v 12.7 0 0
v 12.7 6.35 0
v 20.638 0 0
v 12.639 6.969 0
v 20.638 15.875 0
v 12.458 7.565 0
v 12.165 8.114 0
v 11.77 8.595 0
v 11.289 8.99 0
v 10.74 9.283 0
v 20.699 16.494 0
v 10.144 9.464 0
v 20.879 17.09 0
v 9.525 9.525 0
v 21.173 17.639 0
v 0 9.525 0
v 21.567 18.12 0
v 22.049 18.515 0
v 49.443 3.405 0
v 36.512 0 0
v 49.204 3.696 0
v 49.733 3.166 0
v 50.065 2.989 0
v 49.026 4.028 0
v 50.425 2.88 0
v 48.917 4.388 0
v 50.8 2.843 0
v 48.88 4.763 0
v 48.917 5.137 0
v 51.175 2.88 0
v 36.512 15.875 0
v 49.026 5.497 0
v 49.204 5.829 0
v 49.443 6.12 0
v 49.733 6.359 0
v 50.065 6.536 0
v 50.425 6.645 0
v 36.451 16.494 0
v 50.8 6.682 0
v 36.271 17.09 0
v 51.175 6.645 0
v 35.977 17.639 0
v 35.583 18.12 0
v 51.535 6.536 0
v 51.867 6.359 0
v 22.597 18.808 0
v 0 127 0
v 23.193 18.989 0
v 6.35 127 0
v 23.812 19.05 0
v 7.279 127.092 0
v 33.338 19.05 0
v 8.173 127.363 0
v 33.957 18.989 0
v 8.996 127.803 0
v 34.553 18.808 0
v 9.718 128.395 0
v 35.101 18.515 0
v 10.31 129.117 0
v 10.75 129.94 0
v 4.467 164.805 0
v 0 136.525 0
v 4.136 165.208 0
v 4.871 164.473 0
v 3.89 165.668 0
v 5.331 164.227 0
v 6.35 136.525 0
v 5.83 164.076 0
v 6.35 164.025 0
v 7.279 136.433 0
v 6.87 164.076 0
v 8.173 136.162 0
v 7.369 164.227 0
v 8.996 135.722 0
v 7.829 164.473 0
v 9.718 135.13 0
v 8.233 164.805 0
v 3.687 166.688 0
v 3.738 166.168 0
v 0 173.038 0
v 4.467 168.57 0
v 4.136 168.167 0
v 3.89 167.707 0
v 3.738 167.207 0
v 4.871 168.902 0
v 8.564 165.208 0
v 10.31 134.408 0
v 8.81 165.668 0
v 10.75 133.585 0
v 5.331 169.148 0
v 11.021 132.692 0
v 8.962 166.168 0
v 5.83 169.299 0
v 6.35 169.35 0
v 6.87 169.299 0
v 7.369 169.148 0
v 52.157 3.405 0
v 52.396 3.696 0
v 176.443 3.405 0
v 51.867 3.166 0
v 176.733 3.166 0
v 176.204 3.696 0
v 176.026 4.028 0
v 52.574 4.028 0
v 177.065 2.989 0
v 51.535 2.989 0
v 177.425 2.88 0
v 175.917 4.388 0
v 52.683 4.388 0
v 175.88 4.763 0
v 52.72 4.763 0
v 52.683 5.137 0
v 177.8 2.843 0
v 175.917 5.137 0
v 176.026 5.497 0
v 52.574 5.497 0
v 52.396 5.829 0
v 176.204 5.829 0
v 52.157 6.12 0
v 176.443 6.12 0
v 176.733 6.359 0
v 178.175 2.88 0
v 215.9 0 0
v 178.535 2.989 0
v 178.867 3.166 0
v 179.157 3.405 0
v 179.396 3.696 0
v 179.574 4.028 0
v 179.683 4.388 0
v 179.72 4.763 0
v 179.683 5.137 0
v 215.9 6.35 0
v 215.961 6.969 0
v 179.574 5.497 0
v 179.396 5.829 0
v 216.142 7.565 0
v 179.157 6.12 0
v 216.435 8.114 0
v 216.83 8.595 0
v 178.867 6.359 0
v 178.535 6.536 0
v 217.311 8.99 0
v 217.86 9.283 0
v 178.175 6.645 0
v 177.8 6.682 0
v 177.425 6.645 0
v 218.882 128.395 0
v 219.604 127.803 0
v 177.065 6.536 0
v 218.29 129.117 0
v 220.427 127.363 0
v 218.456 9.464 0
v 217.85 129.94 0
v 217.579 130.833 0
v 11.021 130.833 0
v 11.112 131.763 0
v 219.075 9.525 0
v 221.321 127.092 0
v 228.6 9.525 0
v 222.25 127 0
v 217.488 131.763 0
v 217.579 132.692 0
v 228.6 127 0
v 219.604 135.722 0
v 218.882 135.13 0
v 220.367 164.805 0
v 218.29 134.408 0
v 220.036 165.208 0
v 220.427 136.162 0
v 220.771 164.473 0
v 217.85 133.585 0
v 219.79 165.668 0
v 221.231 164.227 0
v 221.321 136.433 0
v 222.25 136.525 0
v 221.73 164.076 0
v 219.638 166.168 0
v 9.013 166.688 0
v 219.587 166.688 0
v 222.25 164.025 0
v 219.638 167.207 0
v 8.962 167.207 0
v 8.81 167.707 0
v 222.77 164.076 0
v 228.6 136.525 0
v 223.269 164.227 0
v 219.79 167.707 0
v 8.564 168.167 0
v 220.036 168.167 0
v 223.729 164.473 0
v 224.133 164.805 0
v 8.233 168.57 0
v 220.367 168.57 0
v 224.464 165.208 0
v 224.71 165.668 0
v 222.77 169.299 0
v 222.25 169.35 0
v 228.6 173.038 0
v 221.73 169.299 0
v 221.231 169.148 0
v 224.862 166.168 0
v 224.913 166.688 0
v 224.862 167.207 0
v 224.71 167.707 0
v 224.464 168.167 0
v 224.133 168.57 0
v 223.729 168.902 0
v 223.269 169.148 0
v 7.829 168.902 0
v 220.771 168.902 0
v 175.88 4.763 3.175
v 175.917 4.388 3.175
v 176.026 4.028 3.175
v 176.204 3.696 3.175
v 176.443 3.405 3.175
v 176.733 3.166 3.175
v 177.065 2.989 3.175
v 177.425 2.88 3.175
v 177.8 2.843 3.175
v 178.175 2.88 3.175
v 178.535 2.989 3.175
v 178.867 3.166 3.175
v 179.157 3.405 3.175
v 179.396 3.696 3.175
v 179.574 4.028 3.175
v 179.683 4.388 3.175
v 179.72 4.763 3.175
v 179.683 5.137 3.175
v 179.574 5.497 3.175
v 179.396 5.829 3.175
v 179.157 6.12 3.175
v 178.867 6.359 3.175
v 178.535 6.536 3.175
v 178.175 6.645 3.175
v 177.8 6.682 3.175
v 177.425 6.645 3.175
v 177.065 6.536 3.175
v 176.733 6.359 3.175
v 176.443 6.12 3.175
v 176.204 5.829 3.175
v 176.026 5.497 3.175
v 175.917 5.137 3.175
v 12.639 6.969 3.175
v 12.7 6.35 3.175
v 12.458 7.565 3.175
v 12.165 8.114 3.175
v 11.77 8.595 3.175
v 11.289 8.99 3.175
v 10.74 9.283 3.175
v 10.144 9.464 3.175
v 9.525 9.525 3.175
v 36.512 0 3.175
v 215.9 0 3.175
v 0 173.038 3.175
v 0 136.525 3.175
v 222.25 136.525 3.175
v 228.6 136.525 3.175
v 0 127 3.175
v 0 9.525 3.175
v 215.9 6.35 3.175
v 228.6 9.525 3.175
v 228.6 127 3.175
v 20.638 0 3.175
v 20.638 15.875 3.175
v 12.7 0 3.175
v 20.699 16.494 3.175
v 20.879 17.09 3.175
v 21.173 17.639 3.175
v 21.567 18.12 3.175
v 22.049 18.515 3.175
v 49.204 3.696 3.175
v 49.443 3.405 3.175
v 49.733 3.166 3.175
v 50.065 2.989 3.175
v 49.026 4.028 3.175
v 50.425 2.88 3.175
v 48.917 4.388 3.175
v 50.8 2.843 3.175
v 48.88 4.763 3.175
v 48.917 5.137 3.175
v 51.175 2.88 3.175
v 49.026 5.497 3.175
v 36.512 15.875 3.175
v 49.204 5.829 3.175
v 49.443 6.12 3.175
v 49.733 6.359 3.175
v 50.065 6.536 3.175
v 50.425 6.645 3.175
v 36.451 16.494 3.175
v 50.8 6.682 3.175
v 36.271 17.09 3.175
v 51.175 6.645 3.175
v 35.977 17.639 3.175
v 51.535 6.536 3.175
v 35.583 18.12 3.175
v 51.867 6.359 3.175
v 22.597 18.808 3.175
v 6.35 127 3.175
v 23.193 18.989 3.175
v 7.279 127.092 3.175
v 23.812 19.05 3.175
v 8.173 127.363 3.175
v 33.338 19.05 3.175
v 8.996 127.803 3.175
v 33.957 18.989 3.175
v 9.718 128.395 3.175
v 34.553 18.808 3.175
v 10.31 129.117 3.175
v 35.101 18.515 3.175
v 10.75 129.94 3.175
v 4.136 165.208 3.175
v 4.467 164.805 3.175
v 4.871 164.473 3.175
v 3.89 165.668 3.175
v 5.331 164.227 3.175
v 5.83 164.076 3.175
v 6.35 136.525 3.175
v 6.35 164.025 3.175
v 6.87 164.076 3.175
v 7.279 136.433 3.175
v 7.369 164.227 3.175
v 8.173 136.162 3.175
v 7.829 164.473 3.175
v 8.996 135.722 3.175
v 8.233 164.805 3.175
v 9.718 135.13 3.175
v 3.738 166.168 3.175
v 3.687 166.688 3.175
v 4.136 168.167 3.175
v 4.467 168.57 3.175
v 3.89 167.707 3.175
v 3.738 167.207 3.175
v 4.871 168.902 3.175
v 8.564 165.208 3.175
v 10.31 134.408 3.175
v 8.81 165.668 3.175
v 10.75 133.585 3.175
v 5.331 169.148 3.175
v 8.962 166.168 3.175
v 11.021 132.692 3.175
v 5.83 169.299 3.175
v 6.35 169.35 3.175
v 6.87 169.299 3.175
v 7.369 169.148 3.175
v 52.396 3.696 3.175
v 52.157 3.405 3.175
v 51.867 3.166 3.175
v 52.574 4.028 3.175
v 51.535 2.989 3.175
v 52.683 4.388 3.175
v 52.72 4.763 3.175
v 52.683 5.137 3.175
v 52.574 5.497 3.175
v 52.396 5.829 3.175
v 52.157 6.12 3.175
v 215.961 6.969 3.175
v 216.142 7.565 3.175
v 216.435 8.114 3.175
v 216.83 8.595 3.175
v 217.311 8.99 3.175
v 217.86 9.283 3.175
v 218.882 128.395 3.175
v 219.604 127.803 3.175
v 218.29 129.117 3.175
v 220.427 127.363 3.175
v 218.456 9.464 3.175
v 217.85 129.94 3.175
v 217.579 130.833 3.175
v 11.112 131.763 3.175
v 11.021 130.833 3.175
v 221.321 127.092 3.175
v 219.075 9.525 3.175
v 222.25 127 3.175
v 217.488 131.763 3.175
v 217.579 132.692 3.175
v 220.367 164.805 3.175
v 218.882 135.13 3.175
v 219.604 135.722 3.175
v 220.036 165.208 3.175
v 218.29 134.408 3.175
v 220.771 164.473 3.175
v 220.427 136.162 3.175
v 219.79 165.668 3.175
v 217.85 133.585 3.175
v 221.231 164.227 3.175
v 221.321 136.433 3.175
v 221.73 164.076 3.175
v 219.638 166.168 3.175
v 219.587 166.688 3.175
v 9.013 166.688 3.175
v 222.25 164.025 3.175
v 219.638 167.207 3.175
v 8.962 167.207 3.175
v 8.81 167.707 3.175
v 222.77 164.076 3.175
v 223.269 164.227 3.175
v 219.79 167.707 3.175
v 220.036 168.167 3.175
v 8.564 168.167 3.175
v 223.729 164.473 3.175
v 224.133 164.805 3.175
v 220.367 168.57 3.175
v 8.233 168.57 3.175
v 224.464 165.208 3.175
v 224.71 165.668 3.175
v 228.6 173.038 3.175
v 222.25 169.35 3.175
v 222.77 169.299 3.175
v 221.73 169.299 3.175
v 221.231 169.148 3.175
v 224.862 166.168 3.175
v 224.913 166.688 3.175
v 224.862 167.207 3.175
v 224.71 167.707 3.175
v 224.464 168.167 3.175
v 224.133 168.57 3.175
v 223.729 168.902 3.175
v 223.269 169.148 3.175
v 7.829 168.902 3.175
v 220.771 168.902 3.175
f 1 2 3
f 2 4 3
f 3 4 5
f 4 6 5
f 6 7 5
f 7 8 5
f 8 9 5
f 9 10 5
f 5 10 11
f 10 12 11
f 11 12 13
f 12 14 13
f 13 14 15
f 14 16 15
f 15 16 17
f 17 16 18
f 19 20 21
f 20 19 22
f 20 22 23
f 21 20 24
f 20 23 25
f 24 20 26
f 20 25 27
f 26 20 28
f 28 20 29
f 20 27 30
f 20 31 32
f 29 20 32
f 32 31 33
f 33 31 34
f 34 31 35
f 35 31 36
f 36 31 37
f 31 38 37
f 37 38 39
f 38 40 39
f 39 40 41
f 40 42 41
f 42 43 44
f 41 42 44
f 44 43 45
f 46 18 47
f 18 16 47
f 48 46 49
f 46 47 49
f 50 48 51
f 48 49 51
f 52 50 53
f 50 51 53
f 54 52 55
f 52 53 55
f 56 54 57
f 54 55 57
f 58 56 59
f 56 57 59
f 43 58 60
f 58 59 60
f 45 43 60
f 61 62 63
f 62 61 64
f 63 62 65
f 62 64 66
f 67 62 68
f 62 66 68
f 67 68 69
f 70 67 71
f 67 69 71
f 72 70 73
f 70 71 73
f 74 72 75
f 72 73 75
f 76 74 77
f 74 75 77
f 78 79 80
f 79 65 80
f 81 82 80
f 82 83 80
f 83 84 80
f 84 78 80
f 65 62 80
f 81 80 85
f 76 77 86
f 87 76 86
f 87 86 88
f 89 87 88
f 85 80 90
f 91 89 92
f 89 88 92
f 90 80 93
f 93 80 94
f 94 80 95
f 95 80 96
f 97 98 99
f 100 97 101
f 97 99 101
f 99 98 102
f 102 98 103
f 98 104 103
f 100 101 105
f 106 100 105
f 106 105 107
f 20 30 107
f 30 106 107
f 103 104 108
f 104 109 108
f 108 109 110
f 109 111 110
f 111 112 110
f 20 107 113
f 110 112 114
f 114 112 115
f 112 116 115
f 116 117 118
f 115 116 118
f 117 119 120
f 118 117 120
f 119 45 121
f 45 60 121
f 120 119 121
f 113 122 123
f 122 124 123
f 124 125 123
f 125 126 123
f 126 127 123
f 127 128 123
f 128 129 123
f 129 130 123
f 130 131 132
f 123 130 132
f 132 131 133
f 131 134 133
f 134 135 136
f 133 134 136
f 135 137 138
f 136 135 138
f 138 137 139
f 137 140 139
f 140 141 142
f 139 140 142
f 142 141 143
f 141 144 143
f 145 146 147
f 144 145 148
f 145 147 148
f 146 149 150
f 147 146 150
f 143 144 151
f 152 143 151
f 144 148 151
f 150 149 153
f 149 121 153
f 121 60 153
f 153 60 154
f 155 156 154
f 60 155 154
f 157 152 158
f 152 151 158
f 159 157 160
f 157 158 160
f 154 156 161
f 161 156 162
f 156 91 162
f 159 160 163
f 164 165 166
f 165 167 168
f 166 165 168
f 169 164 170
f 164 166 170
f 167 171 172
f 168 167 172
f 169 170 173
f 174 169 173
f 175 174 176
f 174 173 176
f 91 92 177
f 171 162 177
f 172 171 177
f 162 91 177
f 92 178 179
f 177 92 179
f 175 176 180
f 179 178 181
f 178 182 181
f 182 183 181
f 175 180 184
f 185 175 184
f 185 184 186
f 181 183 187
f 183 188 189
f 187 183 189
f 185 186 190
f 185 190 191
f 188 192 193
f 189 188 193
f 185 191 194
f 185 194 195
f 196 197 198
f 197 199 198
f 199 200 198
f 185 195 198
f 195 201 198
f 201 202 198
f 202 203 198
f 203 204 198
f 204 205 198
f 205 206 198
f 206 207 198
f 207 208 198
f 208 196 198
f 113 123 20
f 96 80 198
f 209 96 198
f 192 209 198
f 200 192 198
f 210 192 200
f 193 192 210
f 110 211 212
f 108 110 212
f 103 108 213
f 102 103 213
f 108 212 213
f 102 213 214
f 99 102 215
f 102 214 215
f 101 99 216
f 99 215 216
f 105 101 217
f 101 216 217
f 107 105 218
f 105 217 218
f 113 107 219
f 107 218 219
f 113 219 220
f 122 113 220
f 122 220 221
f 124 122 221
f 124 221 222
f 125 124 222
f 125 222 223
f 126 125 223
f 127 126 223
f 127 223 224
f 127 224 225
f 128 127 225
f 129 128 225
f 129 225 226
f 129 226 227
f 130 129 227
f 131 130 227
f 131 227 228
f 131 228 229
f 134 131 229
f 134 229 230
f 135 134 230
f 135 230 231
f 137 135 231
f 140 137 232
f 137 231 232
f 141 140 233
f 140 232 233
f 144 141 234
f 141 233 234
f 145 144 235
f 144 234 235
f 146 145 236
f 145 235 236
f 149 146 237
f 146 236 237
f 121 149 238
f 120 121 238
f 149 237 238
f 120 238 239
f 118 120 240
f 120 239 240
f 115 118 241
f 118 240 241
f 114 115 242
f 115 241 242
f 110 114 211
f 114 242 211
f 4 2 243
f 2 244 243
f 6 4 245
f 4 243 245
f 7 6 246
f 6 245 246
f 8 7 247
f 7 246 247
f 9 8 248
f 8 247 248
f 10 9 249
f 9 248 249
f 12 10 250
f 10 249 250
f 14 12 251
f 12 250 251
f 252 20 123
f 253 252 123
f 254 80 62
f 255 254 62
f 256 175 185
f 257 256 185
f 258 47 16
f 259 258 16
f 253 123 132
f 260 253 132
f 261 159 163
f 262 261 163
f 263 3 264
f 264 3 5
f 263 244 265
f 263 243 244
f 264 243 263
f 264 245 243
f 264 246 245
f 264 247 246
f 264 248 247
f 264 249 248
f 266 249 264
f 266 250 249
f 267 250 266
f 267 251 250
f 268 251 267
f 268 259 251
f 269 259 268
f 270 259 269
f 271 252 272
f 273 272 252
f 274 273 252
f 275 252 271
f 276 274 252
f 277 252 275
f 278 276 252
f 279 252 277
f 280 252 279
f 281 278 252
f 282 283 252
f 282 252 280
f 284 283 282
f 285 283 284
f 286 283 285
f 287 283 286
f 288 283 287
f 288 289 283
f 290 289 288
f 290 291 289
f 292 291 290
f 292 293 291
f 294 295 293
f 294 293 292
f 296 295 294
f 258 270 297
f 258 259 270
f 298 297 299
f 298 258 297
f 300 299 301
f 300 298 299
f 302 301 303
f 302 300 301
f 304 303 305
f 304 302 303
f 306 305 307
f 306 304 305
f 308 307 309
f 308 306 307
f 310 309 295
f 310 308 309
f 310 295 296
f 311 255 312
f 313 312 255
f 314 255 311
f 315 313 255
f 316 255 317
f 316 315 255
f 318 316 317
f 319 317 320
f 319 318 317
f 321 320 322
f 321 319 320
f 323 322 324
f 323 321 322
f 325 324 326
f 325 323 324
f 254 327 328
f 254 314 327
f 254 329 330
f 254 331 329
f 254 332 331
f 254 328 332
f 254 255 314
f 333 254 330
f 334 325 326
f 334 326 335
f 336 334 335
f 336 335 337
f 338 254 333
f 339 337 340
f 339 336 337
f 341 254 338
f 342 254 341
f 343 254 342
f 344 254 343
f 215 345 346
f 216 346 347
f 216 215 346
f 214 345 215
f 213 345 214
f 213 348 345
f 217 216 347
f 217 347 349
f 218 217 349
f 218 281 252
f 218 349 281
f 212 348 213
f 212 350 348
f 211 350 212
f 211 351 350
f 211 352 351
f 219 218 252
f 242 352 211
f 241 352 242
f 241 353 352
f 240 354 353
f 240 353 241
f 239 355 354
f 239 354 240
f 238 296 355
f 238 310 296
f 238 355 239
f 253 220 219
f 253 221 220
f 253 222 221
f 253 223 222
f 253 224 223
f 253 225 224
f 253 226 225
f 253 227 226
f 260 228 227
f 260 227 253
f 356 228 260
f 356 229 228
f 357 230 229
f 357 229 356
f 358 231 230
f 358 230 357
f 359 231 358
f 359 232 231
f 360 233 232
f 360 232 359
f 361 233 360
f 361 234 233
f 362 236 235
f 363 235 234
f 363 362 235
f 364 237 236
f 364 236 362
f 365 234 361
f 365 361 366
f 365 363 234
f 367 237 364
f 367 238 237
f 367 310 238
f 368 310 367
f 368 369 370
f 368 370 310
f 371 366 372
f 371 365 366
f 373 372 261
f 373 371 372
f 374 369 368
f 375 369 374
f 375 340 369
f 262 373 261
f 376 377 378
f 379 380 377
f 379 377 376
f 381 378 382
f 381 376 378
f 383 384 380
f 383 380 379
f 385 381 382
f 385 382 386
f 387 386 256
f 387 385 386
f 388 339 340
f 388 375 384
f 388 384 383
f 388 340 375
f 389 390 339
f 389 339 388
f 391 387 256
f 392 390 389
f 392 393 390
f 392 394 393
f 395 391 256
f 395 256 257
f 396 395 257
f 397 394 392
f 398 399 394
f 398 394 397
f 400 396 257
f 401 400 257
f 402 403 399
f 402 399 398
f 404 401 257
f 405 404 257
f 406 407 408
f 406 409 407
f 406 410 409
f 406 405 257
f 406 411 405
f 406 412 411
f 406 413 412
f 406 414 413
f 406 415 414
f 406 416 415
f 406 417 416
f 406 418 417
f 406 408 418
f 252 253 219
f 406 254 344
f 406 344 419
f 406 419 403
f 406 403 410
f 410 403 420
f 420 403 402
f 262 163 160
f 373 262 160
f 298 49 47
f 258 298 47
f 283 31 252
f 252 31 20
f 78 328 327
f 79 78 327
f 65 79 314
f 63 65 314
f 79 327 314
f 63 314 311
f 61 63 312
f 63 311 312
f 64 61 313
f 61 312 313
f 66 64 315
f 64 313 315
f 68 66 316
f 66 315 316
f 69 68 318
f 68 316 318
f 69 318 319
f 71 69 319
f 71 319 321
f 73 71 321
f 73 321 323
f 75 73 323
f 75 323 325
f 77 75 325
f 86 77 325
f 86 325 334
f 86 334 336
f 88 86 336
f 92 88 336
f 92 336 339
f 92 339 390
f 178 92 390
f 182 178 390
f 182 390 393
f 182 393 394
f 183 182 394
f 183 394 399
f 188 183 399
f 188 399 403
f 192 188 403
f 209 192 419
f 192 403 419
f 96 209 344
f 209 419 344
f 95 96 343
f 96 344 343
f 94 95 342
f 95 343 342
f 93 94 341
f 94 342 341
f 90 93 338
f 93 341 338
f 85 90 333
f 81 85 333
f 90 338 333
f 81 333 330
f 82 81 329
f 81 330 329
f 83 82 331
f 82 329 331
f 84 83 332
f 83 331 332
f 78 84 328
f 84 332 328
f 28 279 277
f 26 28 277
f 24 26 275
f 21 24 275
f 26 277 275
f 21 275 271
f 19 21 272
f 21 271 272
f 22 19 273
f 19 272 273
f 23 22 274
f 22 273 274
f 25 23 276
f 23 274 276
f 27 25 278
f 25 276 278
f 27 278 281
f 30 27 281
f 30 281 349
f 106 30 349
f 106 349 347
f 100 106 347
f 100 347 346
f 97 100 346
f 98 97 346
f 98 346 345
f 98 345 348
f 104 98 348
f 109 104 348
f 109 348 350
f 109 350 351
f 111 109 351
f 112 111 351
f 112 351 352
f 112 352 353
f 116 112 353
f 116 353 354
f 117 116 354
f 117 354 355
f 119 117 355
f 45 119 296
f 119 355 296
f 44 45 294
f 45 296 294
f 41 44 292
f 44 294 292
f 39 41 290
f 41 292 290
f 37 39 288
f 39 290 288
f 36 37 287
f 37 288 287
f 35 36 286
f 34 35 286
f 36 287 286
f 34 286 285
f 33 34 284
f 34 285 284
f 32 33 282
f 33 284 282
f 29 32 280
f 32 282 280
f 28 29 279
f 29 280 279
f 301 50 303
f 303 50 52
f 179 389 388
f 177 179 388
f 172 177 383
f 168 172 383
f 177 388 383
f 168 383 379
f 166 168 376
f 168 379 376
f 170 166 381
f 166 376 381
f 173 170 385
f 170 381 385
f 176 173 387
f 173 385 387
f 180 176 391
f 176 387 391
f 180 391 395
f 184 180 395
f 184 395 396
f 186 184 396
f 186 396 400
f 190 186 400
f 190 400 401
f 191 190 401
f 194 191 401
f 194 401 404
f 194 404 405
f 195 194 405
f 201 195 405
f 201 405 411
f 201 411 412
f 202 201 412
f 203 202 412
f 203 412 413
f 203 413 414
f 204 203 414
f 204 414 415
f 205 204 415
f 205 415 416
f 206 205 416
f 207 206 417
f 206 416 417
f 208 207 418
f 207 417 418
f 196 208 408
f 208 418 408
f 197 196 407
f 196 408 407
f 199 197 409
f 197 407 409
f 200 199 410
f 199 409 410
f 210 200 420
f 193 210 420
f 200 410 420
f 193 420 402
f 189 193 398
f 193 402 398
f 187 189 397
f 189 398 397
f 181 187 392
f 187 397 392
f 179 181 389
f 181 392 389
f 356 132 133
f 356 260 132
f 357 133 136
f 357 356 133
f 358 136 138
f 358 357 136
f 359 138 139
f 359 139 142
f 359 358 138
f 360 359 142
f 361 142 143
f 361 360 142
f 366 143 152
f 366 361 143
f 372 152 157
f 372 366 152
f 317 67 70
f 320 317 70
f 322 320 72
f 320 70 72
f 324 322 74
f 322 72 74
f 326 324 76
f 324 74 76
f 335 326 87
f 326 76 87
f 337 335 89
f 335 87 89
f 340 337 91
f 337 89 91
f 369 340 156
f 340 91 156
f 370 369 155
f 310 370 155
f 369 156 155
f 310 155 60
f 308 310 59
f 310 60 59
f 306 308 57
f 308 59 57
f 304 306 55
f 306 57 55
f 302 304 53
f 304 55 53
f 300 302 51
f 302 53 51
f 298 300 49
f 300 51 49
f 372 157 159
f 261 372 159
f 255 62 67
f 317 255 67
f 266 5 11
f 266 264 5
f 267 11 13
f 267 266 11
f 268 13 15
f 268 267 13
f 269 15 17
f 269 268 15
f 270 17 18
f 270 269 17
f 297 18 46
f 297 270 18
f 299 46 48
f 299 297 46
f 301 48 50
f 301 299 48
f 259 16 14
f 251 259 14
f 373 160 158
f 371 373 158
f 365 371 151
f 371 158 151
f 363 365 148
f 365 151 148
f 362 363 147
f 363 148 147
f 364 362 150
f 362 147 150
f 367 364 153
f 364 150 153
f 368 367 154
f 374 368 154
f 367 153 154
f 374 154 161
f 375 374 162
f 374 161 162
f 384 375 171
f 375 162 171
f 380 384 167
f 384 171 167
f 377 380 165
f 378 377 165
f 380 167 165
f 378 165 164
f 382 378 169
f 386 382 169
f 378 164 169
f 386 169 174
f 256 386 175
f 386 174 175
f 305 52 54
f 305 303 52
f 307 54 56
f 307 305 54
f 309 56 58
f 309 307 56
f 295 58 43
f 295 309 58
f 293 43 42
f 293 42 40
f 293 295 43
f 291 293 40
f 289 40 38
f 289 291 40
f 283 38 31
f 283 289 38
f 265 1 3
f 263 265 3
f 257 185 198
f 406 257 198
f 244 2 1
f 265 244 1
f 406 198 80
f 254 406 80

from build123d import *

# Parameters (mm, degrees)
F1_DEPTH = 3.175
F2_D     = 3.8395348837
F3_D     = 5.3258064516
F4_R     = 3.175


with BuildPart() as f1:
    # F0 (on Top) → F1 (new body)
    with BuildSketch(Plane.XY):
        with BuildLine():
            Line((12.7, 9.525), (12.7, 0))
            Line((12.7, 0), (20.6375, 0))
            Line((20.6375, 0), (20.6375, 19.05))
            Line((20.6375, 19.05), (36.5125, 19.05))
            Line((36.5125, 19.05), (36.5125, 0))
            Line((36.5125, 0), (215.9, 0))
            Line((215.9, 0), (215.9, 9.525))
            Line((215.9, 9.525), (228.6, 9.525))
            Line((228.6, 9.525), (228.6, 127))
            Line((228.6, 127), (222.25, 127))
            ThreePointArc((222.25, 127), (217.4875, 131.7625), (222.25, 136.525))
            Line((222.25, 136.525), (228.6, 136.525))
            Line((228.6, 136.525), (228.6, 173.0375))
            Line((228.6, 173.0375), (0, 173.0375))
            Line((0, 173.0375), (0, 136.525))
            Line((0, 136.525), (6.35, 136.525))
            ThreePointArc((6.35, 136.525), (11.1125, 131.7625), (6.35, 127))
            Line((6.35, 127), (0, 127))
            Line((0, 127), (0, 9.525))
            Line((0, 9.525), (12.7, 9.525))
        make_face()
    extrude(amount=F1_DEPTH)

    # F2 (through all)
    with Locations(Plane(origin=(0, 0, 0), x_dir=(1, 0, 0), z_dir=(0, 0, -1))):
        with Locations((50.8, -4.7625), (177.8, -4.7625)):
            Hole(F2_D / 2)

    # F3 (through all)
    with Locations(Plane(origin=(0, 0, 0), x_dir=(1, 0, 0), z_dir=(0, 0, -1))):
        with Locations((6.35, -166.6875), (222.25, -166.6875)):
            Hole(F3_D / 2)

    # F4
    f4_edges = [f1.edges().sort_by_distance(p)[0] for p in [
        (215.9, 9.525, 1.5875),
        (12.7, 9.525, 1.5875),
        (36.5125, 19.05, 1.5875),
        (20.6375, 19.05, 1.5875),
    ]]
    fillet(f4_edges, radius=F4_R)


solid = f1.part
